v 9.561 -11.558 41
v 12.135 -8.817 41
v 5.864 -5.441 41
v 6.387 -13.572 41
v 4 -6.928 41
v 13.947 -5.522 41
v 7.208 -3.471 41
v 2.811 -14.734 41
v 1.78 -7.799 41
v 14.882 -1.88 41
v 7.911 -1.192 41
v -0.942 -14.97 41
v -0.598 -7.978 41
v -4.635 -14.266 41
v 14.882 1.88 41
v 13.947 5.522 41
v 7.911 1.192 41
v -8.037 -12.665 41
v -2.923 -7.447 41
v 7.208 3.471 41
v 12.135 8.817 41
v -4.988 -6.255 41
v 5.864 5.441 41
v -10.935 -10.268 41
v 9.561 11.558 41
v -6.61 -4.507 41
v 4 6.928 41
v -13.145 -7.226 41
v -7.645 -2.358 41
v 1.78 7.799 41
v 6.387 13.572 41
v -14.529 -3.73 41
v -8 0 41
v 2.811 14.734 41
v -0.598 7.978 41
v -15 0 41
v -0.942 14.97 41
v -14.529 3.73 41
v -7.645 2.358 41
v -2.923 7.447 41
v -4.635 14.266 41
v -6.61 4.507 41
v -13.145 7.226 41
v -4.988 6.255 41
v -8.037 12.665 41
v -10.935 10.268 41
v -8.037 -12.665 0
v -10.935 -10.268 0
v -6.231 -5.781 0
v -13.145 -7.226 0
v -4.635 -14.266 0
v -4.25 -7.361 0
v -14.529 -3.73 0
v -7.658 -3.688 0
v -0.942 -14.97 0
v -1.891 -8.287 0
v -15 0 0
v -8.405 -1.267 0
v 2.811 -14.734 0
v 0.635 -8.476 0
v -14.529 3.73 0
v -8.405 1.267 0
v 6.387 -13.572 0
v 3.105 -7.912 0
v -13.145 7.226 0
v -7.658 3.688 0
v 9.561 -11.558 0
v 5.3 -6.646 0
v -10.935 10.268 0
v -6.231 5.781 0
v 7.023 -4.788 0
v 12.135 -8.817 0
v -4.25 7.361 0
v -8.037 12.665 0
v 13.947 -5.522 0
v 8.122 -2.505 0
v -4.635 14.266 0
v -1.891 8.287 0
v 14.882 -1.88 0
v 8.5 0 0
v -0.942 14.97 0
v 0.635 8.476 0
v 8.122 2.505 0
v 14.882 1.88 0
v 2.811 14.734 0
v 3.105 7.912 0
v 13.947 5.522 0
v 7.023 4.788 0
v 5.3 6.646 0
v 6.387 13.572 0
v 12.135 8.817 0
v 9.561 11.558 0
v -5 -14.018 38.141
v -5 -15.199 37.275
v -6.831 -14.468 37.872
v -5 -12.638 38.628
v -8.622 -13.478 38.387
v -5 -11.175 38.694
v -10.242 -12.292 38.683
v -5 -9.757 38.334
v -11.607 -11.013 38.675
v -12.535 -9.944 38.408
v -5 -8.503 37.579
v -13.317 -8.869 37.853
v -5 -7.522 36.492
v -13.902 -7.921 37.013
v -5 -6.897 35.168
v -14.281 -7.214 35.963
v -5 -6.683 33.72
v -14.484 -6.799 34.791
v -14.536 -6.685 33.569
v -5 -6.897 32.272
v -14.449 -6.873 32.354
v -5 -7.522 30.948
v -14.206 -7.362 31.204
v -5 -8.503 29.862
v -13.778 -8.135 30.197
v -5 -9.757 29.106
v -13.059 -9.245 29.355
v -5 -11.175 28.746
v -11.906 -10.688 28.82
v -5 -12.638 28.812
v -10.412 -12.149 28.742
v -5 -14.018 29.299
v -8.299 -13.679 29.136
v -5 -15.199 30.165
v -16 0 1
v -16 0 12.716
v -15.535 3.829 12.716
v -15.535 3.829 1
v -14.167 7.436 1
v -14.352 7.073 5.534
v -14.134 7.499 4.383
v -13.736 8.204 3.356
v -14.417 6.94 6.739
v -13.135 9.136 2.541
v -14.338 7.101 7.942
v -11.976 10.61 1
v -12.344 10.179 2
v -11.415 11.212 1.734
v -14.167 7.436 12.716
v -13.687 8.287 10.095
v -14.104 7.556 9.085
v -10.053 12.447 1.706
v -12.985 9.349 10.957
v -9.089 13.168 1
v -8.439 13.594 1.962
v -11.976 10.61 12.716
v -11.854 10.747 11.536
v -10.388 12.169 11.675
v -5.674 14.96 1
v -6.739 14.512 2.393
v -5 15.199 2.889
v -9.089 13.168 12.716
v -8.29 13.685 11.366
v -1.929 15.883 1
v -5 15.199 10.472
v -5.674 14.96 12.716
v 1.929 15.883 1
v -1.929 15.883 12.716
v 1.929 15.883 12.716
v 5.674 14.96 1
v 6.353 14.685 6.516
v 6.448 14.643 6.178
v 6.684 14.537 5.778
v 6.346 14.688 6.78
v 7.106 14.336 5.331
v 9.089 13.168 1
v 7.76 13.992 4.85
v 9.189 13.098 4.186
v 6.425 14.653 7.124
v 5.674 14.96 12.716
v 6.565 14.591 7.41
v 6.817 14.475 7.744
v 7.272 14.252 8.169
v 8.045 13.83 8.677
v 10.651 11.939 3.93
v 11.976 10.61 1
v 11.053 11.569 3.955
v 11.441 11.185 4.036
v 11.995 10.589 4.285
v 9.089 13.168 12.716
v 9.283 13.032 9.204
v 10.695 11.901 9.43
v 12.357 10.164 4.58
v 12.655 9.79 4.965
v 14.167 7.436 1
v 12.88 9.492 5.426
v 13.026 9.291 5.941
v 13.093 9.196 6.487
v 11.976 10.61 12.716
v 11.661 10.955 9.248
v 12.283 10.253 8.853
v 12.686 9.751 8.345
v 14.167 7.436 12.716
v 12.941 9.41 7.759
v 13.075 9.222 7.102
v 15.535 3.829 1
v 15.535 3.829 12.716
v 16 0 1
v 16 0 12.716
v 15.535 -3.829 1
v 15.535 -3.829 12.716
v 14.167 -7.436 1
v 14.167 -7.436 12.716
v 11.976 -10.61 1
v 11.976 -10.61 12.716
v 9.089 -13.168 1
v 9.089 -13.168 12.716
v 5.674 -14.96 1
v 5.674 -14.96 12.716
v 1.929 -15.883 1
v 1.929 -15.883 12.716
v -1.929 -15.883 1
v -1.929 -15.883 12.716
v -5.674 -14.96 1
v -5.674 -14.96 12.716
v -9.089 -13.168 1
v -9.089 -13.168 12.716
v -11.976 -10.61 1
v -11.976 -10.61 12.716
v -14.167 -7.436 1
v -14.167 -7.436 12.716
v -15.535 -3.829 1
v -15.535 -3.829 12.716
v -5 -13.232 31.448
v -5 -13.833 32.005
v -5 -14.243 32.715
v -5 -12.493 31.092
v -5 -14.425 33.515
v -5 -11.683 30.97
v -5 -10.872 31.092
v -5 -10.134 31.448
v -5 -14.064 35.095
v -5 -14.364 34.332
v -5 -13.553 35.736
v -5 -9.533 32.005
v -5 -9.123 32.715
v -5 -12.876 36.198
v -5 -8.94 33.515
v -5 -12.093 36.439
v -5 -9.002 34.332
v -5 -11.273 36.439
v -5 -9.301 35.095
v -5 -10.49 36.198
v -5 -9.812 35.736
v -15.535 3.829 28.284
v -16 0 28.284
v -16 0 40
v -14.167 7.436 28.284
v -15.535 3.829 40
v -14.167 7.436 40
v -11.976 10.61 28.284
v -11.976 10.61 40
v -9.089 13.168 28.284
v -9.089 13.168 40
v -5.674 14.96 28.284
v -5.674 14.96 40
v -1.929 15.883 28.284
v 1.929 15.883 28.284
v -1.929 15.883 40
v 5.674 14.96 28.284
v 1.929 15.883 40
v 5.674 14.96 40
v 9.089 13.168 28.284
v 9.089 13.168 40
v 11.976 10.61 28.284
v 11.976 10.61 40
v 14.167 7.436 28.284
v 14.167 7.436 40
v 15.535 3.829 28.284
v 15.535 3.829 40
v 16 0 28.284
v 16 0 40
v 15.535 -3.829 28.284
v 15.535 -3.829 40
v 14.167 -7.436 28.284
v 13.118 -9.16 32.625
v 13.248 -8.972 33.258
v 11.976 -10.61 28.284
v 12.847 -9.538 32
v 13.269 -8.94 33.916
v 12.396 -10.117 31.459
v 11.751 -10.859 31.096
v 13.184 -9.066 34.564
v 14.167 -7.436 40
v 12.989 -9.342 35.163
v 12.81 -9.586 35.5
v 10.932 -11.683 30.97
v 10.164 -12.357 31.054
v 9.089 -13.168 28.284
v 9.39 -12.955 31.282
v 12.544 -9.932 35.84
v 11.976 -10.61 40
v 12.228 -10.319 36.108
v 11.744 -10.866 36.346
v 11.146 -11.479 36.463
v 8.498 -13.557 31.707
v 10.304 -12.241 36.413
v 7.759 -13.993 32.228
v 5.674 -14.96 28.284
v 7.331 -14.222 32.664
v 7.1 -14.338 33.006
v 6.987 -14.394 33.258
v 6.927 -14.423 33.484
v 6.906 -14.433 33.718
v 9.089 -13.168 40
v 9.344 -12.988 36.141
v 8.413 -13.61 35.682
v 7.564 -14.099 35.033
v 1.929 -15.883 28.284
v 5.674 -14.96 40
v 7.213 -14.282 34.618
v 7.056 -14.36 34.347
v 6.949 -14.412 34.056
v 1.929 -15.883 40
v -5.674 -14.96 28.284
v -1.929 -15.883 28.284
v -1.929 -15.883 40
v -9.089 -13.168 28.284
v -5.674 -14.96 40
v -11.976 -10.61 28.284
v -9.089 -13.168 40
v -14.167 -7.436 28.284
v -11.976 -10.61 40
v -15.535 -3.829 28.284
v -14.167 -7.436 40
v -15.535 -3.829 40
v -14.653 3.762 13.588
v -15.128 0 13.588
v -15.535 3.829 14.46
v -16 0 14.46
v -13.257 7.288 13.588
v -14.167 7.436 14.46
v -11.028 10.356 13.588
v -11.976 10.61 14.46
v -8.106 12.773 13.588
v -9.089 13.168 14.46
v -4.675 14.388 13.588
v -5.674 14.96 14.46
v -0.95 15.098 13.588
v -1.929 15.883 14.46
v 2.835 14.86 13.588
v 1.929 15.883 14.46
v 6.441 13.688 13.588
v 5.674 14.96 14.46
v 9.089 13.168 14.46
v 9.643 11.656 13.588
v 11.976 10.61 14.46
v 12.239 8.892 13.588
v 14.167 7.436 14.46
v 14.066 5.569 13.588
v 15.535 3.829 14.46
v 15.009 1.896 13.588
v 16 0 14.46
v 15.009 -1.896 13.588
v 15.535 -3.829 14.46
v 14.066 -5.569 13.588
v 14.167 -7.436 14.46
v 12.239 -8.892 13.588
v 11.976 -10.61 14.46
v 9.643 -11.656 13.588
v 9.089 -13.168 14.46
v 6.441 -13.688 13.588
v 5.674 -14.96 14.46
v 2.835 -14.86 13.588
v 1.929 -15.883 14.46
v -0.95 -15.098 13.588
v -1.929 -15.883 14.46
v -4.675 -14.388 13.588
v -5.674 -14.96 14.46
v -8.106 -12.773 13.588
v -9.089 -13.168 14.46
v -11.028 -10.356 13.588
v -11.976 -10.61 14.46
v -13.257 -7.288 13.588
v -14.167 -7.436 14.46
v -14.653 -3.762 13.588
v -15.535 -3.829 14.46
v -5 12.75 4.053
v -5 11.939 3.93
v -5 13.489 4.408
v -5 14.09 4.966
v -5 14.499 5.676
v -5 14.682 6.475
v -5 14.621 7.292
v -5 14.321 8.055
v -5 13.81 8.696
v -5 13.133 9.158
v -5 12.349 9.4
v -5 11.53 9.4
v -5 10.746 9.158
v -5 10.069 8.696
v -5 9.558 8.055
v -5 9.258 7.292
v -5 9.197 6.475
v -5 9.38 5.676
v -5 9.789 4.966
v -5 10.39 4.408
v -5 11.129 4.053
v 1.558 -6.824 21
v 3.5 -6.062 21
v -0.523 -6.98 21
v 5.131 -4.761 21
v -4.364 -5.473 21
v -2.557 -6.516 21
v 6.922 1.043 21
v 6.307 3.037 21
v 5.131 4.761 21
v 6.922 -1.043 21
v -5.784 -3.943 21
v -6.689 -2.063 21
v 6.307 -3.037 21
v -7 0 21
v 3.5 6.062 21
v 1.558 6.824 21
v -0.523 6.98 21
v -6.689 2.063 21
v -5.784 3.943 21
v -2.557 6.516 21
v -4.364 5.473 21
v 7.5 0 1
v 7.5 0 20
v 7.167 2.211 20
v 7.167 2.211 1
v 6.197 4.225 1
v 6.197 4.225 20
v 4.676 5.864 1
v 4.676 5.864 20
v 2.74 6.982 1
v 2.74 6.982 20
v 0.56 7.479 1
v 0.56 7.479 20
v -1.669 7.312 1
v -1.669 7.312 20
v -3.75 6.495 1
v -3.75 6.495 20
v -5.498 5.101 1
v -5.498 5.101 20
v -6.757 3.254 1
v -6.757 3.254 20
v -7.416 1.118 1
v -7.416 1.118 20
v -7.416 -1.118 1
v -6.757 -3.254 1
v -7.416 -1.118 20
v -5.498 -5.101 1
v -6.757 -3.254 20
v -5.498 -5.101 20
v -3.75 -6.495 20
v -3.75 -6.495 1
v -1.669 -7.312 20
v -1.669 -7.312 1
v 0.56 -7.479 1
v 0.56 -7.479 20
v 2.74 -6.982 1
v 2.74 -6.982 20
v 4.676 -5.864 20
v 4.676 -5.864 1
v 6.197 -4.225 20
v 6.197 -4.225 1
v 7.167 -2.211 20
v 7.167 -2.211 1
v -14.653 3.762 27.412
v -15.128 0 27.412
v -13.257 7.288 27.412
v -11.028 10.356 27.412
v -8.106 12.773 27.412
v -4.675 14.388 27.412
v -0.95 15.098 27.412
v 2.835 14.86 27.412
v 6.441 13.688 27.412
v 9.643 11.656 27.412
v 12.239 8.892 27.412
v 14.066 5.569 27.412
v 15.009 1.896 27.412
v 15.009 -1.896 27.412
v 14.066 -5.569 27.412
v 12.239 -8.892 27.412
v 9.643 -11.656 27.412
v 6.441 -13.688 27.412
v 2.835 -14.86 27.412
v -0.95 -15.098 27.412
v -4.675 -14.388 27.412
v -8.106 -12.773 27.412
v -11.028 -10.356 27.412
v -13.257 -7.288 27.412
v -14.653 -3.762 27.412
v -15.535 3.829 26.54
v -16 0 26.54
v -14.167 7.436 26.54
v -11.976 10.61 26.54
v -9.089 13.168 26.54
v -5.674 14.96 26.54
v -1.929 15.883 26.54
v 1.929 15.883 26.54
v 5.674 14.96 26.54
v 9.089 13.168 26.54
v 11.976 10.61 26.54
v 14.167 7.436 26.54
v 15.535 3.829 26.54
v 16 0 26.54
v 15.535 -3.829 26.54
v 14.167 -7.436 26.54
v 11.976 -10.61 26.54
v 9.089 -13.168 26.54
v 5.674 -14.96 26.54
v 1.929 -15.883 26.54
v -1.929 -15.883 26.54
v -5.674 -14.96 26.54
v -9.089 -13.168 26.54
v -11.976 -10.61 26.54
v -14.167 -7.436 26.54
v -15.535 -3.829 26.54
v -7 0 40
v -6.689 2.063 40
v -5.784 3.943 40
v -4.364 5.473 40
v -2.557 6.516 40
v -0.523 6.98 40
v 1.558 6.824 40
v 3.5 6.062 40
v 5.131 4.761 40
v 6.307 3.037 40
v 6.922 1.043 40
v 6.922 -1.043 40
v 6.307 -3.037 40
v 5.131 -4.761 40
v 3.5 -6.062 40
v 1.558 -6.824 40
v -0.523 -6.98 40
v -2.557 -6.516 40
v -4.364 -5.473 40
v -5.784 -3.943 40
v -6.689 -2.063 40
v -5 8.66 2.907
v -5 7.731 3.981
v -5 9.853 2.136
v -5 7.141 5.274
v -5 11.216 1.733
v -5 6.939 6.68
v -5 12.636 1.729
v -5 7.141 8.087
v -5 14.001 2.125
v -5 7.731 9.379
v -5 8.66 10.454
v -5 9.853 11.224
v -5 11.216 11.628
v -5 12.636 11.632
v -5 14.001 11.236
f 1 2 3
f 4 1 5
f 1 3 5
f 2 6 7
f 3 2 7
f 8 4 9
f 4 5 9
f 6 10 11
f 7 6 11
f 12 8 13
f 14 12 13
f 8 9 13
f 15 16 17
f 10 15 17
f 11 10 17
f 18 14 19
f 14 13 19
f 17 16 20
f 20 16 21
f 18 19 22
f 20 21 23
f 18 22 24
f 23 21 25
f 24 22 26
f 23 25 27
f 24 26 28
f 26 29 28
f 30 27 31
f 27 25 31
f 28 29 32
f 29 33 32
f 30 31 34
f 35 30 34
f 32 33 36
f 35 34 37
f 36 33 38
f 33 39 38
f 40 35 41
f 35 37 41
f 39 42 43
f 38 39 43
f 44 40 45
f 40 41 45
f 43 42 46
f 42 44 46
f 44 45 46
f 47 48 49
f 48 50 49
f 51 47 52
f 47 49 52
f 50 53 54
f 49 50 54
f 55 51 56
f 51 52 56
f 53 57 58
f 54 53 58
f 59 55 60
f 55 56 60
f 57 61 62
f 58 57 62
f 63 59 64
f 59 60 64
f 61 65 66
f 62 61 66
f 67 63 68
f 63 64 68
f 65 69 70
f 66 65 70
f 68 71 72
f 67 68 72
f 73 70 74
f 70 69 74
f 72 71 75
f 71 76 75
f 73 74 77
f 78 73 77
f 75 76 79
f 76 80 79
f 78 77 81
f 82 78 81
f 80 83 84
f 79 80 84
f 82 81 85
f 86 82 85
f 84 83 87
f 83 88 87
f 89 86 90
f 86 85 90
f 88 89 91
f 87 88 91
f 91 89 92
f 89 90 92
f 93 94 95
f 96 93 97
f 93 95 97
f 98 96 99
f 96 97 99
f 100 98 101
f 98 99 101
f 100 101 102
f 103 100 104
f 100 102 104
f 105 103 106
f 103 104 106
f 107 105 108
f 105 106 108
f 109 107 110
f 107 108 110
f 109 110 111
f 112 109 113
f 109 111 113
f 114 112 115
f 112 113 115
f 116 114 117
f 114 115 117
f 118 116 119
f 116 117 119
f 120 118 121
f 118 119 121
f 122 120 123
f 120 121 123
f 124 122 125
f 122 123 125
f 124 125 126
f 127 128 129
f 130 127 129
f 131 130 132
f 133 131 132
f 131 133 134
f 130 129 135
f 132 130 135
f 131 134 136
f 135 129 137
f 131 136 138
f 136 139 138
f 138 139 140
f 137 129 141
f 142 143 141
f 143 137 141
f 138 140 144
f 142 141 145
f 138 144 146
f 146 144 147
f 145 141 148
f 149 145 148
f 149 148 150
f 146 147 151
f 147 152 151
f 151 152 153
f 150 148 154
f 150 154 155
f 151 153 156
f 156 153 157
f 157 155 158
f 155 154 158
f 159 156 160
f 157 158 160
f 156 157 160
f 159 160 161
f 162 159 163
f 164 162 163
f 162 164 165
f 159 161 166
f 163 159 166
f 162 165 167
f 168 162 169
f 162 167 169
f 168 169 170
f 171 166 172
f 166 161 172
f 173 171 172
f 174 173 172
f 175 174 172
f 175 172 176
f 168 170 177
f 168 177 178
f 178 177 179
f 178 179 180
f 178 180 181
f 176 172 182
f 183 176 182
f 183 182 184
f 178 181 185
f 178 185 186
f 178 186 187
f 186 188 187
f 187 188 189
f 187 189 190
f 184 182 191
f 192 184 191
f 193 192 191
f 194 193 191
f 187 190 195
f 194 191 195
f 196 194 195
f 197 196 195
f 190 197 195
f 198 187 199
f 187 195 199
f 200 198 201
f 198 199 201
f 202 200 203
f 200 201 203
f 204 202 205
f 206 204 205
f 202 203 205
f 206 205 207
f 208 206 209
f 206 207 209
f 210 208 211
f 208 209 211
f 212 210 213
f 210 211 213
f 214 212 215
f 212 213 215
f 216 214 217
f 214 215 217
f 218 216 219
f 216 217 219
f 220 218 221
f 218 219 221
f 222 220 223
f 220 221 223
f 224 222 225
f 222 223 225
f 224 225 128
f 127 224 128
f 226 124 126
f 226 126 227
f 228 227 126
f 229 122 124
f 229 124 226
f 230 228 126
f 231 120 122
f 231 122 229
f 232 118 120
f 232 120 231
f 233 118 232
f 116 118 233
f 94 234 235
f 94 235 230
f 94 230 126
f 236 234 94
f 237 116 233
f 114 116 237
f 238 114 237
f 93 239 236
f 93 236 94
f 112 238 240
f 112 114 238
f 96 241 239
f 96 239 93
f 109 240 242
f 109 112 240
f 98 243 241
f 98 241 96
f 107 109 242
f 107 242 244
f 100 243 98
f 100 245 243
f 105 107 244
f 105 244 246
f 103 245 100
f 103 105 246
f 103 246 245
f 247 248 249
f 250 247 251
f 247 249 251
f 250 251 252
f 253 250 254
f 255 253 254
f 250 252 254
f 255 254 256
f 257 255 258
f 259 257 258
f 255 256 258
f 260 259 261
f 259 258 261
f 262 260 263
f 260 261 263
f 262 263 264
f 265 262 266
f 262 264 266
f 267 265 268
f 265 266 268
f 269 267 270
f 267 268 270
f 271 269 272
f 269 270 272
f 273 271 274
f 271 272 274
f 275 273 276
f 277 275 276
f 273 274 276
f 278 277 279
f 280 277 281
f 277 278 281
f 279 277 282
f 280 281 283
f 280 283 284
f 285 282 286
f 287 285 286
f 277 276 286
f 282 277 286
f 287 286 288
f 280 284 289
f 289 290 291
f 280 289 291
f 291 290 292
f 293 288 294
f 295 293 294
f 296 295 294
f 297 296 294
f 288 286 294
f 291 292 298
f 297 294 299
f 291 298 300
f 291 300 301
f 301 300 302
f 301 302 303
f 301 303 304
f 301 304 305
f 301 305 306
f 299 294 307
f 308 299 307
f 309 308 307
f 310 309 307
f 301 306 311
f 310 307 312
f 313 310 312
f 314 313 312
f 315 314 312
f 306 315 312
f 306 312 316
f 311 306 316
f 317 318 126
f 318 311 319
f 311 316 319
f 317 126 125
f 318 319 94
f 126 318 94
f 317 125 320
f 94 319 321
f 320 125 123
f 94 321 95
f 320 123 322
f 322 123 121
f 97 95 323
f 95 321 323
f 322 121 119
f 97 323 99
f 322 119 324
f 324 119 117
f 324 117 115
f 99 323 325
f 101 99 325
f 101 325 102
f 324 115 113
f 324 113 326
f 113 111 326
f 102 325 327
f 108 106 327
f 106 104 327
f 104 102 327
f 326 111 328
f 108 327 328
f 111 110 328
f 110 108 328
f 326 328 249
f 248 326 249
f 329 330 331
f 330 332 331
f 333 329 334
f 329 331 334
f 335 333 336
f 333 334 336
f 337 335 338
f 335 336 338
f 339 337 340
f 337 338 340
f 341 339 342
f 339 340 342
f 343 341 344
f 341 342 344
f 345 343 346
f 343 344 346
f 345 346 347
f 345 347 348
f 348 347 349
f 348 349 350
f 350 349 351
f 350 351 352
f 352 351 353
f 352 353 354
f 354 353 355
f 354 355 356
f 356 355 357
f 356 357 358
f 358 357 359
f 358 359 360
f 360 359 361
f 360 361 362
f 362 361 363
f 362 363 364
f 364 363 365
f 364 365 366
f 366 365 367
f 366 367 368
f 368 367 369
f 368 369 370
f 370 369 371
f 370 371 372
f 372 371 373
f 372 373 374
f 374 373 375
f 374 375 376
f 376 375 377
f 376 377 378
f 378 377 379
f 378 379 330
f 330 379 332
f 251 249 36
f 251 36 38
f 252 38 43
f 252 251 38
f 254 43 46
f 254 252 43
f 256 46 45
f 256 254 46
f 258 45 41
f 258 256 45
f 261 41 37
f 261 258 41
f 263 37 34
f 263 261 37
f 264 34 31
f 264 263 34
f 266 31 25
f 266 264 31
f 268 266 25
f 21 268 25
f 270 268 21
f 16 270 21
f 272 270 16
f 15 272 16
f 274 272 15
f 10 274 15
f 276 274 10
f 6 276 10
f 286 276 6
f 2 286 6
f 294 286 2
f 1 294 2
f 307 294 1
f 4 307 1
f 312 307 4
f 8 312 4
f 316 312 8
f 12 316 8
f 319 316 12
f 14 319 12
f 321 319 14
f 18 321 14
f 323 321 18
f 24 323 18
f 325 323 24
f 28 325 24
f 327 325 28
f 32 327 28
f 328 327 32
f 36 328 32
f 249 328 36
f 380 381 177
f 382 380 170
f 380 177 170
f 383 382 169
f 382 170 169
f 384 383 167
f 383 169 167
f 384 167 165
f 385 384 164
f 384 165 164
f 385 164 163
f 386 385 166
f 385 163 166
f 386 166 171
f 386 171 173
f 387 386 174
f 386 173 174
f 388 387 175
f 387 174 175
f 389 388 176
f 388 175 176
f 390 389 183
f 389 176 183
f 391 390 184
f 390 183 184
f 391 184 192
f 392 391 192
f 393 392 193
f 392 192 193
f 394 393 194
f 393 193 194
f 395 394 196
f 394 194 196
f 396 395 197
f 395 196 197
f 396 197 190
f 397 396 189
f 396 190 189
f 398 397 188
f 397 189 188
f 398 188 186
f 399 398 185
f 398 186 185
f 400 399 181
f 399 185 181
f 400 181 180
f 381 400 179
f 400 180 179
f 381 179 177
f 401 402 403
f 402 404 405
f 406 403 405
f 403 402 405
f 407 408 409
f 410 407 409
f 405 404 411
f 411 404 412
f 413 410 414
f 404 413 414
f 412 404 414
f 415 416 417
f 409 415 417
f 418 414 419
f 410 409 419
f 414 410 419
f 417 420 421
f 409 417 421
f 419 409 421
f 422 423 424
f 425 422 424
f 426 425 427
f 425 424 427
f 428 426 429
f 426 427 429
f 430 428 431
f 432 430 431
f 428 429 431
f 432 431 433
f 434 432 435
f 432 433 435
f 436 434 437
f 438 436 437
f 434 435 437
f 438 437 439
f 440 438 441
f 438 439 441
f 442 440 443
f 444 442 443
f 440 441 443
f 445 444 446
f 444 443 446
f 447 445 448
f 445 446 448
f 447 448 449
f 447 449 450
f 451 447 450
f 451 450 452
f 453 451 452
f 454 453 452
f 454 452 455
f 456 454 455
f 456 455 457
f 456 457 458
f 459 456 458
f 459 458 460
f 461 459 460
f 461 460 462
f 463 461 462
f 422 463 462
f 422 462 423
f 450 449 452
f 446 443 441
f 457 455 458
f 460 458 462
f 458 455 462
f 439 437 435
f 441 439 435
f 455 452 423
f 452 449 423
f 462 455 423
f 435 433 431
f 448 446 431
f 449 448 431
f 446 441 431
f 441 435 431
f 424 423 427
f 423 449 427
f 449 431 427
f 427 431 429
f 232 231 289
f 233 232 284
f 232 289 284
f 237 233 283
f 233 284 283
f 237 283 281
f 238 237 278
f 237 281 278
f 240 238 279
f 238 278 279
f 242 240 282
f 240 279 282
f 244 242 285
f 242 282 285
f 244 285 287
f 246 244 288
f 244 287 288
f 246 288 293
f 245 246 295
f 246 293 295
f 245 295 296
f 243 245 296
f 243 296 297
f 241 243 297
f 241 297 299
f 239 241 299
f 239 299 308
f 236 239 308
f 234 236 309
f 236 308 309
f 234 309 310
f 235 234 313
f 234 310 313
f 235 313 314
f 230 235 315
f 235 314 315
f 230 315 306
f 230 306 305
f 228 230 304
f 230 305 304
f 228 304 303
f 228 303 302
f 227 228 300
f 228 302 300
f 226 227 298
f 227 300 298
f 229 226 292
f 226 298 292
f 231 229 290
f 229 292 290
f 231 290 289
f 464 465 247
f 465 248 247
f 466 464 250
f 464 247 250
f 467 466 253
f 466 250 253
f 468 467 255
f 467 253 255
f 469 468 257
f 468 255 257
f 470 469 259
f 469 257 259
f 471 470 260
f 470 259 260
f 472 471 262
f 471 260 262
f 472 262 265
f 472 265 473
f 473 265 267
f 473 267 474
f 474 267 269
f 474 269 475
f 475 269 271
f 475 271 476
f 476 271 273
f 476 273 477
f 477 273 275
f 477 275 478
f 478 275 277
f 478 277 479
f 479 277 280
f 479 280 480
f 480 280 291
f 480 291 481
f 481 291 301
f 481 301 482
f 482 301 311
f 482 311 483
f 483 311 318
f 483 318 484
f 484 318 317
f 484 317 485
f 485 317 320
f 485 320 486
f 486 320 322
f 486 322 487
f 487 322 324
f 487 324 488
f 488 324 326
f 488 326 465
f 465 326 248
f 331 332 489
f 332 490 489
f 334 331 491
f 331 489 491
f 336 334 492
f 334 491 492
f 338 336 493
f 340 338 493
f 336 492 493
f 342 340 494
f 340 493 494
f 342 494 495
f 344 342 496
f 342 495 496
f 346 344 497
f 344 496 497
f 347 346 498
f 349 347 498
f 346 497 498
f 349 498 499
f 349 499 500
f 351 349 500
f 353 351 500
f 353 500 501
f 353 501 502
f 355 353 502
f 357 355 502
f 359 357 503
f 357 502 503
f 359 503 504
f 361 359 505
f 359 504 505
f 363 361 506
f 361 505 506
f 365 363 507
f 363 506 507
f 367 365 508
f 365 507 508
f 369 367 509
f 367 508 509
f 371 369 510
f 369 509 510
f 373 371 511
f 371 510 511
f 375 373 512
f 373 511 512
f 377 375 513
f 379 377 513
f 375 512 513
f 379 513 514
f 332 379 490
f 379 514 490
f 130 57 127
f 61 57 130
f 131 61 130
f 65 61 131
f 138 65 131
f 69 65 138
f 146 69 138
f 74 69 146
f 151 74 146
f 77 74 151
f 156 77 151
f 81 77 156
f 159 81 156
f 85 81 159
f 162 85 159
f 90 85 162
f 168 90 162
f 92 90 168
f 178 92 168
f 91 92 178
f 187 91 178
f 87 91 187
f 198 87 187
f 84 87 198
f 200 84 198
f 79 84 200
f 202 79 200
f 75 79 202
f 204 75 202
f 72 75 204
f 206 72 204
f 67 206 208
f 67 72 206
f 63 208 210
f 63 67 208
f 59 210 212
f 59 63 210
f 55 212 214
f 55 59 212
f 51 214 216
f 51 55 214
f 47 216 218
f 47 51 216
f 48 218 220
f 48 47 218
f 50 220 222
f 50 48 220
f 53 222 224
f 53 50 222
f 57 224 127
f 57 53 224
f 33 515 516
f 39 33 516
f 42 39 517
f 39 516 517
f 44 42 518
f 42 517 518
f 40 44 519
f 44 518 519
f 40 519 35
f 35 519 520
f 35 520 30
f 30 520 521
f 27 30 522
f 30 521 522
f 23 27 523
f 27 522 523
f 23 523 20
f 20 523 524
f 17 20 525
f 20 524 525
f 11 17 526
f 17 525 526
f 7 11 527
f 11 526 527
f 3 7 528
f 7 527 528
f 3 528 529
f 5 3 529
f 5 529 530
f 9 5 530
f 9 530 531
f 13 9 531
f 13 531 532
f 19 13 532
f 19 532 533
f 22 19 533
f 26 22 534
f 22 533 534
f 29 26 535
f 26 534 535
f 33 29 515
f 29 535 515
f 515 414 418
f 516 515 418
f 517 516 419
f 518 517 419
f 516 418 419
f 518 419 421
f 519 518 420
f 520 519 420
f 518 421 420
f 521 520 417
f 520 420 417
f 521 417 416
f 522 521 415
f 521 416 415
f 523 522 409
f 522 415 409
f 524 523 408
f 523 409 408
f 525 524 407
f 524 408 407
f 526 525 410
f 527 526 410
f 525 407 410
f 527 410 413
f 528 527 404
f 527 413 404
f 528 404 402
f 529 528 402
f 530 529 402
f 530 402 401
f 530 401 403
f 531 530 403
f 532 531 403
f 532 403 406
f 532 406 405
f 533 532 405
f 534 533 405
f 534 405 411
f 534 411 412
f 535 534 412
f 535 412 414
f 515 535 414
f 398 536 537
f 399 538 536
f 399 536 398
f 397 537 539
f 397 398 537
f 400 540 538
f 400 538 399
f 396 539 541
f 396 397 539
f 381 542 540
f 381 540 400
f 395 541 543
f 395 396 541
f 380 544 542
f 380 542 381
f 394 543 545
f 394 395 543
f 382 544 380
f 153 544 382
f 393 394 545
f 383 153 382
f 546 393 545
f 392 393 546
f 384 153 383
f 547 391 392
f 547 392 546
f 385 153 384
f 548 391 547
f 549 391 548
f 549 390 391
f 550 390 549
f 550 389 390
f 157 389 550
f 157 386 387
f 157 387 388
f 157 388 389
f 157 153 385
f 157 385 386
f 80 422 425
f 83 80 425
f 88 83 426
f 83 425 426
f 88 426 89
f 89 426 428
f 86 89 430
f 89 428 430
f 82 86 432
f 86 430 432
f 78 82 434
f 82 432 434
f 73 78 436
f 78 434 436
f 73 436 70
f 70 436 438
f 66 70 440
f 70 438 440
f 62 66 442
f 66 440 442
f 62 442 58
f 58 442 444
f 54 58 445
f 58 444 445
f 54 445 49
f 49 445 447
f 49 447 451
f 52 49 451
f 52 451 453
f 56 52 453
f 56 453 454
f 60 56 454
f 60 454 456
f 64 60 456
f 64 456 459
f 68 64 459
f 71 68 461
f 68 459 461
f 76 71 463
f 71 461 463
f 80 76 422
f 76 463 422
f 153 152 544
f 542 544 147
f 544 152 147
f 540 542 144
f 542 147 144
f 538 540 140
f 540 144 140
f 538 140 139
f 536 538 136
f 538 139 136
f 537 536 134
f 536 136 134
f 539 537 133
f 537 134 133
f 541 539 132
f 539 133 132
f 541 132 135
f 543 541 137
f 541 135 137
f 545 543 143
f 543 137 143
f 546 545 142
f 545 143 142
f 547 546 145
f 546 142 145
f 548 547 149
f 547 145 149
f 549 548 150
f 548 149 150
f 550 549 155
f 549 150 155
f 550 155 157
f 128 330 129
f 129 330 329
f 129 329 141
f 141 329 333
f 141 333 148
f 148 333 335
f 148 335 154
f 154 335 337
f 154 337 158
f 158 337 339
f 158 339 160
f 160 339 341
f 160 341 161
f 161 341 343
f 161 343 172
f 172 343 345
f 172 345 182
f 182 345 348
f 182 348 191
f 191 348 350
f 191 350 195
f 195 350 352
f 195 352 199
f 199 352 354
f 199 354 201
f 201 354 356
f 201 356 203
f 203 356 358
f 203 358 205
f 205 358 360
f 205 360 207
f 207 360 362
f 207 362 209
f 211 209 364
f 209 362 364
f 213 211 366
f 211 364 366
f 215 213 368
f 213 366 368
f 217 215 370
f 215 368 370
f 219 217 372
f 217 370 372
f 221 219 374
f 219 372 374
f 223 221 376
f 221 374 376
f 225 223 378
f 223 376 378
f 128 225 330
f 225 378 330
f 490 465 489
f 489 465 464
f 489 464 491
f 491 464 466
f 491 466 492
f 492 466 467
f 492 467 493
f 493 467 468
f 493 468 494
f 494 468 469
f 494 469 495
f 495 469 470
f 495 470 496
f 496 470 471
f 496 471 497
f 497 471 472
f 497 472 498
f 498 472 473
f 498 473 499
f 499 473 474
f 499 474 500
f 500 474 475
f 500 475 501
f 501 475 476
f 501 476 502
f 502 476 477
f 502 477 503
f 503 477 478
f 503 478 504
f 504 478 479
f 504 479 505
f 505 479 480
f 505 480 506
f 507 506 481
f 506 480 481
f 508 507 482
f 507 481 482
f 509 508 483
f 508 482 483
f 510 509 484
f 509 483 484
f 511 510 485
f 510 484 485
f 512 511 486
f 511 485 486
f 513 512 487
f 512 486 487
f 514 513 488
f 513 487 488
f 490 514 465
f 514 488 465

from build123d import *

# Parameters (mm, degrees)
HOLE_WIZARD_M5_1_D           = 5.5
HOLE_WIZARD_M5_1_DEPTH       = 30.416781825
HOLE_WIZARD_M5_1_CBORE_D     = 10
HOLE_WIZARD_M5_1_CBORE_DEPTH = 9.416781825
HOLE_WIZARD_M5_2_D           = 5.5
HOLE_WIZARD_M5_2_DEPTH       = 30.537541482
HOLE_WIZARD_M5_2_CBORE_D     = 10
HOLE_WIZARD_M5_2_CBORE_DEPTH = 9.537541482
HOLE_WIZARD_15_0_15_1_D      = 15
HOLE_WIZARD_15_0_15_1_DEPTH  = 20
HOLE_WIZARD_14_0_14_1_D      = 14
HOLE_WIZARD_14_0_14_1_DEPTH  = 20
CHAMFER_1_SIZE               = 1


with BuildPart() as part:
    # 草图1 → 旋转1 (revolve)
    with BuildSketch(Plane.XZ, mode=Mode.PRIVATE) as revolve_1_sk:
        Polygon((16, 41), (0, 41), (0, 0), (16, 0), (16, 12.716084229), (15.128119248, 13.587964981), (16, 14.459845733), (16, 26.540154267), (15.128119248, 27.412035019), (16, 28.283915771), align=None)
    revolve(revolve_1_sk.sketch.rotate(Axis((0, 0, 41), (0, 0, -1)), 180), axis=Axis((0, 0, 41), (0, 0, -1)))

    # M5 六角头螺栓的柱形沉头孔1
    with Locations(Plane.ZY.offset(14.416781825)):
        with Locations((6.680362699, 11.93948138)):
            CounterBoreHole(HOLE_WIZARD_M5_1_D / 2, HOLE_WIZARD_M5_1_CBORE_D / 2, HOLE_WIZARD_M5_1_CBORE_DEPTH, depth=HOLE_WIZARD_M5_1_DEPTH)

    # M5 六角头螺栓的柱形沉头孔2
    with Locations(Plane.ZY.offset(14.537541482)):
        with Locations((33.720086876, -11.682805373)):
            CounterBoreHole(HOLE_WIZARD_M5_2_D / 2, HOLE_WIZARD_M5_2_CBORE_D / 2, HOLE_WIZARD_M5_2_CBORE_DEPTH, depth=HOLE_WIZARD_M5_2_DEPTH)

    # Ø15.0 (15) 直径孔1
    with Locations(Plane(origin=(0, 0, 0), x_dir=(-1, 0, 0), z_dir=(0, 0, -1))):
        with Locations((0, 0)):
            Hole(HOLE_WIZARD_15_0_15_1_D / 2, depth=HOLE_WIZARD_15_0_15_1_DEPTH)

    # Ø14.0 (14) 直径孔1
    with Locations(Plane.XY.offset(41)):
        with Locations((0, 0)):
            Hole(HOLE_WIZARD_14_0_14_1_D / 2, depth=HOLE_WIZARD_14_0_14_1_DEPTH)

    # 倒角1
    chamfer_1_edges = [part.edges().sort_by_distance(p)[0] for p in [
        (16, 0, 0),
        (16, 0, 41),
        (-7.5, 0, 0),
        (7, 0, 41),
    ]]
    chamfer(chamfer_1_edges, length=CHAMFER_1_SIZE)


solid = part.part
